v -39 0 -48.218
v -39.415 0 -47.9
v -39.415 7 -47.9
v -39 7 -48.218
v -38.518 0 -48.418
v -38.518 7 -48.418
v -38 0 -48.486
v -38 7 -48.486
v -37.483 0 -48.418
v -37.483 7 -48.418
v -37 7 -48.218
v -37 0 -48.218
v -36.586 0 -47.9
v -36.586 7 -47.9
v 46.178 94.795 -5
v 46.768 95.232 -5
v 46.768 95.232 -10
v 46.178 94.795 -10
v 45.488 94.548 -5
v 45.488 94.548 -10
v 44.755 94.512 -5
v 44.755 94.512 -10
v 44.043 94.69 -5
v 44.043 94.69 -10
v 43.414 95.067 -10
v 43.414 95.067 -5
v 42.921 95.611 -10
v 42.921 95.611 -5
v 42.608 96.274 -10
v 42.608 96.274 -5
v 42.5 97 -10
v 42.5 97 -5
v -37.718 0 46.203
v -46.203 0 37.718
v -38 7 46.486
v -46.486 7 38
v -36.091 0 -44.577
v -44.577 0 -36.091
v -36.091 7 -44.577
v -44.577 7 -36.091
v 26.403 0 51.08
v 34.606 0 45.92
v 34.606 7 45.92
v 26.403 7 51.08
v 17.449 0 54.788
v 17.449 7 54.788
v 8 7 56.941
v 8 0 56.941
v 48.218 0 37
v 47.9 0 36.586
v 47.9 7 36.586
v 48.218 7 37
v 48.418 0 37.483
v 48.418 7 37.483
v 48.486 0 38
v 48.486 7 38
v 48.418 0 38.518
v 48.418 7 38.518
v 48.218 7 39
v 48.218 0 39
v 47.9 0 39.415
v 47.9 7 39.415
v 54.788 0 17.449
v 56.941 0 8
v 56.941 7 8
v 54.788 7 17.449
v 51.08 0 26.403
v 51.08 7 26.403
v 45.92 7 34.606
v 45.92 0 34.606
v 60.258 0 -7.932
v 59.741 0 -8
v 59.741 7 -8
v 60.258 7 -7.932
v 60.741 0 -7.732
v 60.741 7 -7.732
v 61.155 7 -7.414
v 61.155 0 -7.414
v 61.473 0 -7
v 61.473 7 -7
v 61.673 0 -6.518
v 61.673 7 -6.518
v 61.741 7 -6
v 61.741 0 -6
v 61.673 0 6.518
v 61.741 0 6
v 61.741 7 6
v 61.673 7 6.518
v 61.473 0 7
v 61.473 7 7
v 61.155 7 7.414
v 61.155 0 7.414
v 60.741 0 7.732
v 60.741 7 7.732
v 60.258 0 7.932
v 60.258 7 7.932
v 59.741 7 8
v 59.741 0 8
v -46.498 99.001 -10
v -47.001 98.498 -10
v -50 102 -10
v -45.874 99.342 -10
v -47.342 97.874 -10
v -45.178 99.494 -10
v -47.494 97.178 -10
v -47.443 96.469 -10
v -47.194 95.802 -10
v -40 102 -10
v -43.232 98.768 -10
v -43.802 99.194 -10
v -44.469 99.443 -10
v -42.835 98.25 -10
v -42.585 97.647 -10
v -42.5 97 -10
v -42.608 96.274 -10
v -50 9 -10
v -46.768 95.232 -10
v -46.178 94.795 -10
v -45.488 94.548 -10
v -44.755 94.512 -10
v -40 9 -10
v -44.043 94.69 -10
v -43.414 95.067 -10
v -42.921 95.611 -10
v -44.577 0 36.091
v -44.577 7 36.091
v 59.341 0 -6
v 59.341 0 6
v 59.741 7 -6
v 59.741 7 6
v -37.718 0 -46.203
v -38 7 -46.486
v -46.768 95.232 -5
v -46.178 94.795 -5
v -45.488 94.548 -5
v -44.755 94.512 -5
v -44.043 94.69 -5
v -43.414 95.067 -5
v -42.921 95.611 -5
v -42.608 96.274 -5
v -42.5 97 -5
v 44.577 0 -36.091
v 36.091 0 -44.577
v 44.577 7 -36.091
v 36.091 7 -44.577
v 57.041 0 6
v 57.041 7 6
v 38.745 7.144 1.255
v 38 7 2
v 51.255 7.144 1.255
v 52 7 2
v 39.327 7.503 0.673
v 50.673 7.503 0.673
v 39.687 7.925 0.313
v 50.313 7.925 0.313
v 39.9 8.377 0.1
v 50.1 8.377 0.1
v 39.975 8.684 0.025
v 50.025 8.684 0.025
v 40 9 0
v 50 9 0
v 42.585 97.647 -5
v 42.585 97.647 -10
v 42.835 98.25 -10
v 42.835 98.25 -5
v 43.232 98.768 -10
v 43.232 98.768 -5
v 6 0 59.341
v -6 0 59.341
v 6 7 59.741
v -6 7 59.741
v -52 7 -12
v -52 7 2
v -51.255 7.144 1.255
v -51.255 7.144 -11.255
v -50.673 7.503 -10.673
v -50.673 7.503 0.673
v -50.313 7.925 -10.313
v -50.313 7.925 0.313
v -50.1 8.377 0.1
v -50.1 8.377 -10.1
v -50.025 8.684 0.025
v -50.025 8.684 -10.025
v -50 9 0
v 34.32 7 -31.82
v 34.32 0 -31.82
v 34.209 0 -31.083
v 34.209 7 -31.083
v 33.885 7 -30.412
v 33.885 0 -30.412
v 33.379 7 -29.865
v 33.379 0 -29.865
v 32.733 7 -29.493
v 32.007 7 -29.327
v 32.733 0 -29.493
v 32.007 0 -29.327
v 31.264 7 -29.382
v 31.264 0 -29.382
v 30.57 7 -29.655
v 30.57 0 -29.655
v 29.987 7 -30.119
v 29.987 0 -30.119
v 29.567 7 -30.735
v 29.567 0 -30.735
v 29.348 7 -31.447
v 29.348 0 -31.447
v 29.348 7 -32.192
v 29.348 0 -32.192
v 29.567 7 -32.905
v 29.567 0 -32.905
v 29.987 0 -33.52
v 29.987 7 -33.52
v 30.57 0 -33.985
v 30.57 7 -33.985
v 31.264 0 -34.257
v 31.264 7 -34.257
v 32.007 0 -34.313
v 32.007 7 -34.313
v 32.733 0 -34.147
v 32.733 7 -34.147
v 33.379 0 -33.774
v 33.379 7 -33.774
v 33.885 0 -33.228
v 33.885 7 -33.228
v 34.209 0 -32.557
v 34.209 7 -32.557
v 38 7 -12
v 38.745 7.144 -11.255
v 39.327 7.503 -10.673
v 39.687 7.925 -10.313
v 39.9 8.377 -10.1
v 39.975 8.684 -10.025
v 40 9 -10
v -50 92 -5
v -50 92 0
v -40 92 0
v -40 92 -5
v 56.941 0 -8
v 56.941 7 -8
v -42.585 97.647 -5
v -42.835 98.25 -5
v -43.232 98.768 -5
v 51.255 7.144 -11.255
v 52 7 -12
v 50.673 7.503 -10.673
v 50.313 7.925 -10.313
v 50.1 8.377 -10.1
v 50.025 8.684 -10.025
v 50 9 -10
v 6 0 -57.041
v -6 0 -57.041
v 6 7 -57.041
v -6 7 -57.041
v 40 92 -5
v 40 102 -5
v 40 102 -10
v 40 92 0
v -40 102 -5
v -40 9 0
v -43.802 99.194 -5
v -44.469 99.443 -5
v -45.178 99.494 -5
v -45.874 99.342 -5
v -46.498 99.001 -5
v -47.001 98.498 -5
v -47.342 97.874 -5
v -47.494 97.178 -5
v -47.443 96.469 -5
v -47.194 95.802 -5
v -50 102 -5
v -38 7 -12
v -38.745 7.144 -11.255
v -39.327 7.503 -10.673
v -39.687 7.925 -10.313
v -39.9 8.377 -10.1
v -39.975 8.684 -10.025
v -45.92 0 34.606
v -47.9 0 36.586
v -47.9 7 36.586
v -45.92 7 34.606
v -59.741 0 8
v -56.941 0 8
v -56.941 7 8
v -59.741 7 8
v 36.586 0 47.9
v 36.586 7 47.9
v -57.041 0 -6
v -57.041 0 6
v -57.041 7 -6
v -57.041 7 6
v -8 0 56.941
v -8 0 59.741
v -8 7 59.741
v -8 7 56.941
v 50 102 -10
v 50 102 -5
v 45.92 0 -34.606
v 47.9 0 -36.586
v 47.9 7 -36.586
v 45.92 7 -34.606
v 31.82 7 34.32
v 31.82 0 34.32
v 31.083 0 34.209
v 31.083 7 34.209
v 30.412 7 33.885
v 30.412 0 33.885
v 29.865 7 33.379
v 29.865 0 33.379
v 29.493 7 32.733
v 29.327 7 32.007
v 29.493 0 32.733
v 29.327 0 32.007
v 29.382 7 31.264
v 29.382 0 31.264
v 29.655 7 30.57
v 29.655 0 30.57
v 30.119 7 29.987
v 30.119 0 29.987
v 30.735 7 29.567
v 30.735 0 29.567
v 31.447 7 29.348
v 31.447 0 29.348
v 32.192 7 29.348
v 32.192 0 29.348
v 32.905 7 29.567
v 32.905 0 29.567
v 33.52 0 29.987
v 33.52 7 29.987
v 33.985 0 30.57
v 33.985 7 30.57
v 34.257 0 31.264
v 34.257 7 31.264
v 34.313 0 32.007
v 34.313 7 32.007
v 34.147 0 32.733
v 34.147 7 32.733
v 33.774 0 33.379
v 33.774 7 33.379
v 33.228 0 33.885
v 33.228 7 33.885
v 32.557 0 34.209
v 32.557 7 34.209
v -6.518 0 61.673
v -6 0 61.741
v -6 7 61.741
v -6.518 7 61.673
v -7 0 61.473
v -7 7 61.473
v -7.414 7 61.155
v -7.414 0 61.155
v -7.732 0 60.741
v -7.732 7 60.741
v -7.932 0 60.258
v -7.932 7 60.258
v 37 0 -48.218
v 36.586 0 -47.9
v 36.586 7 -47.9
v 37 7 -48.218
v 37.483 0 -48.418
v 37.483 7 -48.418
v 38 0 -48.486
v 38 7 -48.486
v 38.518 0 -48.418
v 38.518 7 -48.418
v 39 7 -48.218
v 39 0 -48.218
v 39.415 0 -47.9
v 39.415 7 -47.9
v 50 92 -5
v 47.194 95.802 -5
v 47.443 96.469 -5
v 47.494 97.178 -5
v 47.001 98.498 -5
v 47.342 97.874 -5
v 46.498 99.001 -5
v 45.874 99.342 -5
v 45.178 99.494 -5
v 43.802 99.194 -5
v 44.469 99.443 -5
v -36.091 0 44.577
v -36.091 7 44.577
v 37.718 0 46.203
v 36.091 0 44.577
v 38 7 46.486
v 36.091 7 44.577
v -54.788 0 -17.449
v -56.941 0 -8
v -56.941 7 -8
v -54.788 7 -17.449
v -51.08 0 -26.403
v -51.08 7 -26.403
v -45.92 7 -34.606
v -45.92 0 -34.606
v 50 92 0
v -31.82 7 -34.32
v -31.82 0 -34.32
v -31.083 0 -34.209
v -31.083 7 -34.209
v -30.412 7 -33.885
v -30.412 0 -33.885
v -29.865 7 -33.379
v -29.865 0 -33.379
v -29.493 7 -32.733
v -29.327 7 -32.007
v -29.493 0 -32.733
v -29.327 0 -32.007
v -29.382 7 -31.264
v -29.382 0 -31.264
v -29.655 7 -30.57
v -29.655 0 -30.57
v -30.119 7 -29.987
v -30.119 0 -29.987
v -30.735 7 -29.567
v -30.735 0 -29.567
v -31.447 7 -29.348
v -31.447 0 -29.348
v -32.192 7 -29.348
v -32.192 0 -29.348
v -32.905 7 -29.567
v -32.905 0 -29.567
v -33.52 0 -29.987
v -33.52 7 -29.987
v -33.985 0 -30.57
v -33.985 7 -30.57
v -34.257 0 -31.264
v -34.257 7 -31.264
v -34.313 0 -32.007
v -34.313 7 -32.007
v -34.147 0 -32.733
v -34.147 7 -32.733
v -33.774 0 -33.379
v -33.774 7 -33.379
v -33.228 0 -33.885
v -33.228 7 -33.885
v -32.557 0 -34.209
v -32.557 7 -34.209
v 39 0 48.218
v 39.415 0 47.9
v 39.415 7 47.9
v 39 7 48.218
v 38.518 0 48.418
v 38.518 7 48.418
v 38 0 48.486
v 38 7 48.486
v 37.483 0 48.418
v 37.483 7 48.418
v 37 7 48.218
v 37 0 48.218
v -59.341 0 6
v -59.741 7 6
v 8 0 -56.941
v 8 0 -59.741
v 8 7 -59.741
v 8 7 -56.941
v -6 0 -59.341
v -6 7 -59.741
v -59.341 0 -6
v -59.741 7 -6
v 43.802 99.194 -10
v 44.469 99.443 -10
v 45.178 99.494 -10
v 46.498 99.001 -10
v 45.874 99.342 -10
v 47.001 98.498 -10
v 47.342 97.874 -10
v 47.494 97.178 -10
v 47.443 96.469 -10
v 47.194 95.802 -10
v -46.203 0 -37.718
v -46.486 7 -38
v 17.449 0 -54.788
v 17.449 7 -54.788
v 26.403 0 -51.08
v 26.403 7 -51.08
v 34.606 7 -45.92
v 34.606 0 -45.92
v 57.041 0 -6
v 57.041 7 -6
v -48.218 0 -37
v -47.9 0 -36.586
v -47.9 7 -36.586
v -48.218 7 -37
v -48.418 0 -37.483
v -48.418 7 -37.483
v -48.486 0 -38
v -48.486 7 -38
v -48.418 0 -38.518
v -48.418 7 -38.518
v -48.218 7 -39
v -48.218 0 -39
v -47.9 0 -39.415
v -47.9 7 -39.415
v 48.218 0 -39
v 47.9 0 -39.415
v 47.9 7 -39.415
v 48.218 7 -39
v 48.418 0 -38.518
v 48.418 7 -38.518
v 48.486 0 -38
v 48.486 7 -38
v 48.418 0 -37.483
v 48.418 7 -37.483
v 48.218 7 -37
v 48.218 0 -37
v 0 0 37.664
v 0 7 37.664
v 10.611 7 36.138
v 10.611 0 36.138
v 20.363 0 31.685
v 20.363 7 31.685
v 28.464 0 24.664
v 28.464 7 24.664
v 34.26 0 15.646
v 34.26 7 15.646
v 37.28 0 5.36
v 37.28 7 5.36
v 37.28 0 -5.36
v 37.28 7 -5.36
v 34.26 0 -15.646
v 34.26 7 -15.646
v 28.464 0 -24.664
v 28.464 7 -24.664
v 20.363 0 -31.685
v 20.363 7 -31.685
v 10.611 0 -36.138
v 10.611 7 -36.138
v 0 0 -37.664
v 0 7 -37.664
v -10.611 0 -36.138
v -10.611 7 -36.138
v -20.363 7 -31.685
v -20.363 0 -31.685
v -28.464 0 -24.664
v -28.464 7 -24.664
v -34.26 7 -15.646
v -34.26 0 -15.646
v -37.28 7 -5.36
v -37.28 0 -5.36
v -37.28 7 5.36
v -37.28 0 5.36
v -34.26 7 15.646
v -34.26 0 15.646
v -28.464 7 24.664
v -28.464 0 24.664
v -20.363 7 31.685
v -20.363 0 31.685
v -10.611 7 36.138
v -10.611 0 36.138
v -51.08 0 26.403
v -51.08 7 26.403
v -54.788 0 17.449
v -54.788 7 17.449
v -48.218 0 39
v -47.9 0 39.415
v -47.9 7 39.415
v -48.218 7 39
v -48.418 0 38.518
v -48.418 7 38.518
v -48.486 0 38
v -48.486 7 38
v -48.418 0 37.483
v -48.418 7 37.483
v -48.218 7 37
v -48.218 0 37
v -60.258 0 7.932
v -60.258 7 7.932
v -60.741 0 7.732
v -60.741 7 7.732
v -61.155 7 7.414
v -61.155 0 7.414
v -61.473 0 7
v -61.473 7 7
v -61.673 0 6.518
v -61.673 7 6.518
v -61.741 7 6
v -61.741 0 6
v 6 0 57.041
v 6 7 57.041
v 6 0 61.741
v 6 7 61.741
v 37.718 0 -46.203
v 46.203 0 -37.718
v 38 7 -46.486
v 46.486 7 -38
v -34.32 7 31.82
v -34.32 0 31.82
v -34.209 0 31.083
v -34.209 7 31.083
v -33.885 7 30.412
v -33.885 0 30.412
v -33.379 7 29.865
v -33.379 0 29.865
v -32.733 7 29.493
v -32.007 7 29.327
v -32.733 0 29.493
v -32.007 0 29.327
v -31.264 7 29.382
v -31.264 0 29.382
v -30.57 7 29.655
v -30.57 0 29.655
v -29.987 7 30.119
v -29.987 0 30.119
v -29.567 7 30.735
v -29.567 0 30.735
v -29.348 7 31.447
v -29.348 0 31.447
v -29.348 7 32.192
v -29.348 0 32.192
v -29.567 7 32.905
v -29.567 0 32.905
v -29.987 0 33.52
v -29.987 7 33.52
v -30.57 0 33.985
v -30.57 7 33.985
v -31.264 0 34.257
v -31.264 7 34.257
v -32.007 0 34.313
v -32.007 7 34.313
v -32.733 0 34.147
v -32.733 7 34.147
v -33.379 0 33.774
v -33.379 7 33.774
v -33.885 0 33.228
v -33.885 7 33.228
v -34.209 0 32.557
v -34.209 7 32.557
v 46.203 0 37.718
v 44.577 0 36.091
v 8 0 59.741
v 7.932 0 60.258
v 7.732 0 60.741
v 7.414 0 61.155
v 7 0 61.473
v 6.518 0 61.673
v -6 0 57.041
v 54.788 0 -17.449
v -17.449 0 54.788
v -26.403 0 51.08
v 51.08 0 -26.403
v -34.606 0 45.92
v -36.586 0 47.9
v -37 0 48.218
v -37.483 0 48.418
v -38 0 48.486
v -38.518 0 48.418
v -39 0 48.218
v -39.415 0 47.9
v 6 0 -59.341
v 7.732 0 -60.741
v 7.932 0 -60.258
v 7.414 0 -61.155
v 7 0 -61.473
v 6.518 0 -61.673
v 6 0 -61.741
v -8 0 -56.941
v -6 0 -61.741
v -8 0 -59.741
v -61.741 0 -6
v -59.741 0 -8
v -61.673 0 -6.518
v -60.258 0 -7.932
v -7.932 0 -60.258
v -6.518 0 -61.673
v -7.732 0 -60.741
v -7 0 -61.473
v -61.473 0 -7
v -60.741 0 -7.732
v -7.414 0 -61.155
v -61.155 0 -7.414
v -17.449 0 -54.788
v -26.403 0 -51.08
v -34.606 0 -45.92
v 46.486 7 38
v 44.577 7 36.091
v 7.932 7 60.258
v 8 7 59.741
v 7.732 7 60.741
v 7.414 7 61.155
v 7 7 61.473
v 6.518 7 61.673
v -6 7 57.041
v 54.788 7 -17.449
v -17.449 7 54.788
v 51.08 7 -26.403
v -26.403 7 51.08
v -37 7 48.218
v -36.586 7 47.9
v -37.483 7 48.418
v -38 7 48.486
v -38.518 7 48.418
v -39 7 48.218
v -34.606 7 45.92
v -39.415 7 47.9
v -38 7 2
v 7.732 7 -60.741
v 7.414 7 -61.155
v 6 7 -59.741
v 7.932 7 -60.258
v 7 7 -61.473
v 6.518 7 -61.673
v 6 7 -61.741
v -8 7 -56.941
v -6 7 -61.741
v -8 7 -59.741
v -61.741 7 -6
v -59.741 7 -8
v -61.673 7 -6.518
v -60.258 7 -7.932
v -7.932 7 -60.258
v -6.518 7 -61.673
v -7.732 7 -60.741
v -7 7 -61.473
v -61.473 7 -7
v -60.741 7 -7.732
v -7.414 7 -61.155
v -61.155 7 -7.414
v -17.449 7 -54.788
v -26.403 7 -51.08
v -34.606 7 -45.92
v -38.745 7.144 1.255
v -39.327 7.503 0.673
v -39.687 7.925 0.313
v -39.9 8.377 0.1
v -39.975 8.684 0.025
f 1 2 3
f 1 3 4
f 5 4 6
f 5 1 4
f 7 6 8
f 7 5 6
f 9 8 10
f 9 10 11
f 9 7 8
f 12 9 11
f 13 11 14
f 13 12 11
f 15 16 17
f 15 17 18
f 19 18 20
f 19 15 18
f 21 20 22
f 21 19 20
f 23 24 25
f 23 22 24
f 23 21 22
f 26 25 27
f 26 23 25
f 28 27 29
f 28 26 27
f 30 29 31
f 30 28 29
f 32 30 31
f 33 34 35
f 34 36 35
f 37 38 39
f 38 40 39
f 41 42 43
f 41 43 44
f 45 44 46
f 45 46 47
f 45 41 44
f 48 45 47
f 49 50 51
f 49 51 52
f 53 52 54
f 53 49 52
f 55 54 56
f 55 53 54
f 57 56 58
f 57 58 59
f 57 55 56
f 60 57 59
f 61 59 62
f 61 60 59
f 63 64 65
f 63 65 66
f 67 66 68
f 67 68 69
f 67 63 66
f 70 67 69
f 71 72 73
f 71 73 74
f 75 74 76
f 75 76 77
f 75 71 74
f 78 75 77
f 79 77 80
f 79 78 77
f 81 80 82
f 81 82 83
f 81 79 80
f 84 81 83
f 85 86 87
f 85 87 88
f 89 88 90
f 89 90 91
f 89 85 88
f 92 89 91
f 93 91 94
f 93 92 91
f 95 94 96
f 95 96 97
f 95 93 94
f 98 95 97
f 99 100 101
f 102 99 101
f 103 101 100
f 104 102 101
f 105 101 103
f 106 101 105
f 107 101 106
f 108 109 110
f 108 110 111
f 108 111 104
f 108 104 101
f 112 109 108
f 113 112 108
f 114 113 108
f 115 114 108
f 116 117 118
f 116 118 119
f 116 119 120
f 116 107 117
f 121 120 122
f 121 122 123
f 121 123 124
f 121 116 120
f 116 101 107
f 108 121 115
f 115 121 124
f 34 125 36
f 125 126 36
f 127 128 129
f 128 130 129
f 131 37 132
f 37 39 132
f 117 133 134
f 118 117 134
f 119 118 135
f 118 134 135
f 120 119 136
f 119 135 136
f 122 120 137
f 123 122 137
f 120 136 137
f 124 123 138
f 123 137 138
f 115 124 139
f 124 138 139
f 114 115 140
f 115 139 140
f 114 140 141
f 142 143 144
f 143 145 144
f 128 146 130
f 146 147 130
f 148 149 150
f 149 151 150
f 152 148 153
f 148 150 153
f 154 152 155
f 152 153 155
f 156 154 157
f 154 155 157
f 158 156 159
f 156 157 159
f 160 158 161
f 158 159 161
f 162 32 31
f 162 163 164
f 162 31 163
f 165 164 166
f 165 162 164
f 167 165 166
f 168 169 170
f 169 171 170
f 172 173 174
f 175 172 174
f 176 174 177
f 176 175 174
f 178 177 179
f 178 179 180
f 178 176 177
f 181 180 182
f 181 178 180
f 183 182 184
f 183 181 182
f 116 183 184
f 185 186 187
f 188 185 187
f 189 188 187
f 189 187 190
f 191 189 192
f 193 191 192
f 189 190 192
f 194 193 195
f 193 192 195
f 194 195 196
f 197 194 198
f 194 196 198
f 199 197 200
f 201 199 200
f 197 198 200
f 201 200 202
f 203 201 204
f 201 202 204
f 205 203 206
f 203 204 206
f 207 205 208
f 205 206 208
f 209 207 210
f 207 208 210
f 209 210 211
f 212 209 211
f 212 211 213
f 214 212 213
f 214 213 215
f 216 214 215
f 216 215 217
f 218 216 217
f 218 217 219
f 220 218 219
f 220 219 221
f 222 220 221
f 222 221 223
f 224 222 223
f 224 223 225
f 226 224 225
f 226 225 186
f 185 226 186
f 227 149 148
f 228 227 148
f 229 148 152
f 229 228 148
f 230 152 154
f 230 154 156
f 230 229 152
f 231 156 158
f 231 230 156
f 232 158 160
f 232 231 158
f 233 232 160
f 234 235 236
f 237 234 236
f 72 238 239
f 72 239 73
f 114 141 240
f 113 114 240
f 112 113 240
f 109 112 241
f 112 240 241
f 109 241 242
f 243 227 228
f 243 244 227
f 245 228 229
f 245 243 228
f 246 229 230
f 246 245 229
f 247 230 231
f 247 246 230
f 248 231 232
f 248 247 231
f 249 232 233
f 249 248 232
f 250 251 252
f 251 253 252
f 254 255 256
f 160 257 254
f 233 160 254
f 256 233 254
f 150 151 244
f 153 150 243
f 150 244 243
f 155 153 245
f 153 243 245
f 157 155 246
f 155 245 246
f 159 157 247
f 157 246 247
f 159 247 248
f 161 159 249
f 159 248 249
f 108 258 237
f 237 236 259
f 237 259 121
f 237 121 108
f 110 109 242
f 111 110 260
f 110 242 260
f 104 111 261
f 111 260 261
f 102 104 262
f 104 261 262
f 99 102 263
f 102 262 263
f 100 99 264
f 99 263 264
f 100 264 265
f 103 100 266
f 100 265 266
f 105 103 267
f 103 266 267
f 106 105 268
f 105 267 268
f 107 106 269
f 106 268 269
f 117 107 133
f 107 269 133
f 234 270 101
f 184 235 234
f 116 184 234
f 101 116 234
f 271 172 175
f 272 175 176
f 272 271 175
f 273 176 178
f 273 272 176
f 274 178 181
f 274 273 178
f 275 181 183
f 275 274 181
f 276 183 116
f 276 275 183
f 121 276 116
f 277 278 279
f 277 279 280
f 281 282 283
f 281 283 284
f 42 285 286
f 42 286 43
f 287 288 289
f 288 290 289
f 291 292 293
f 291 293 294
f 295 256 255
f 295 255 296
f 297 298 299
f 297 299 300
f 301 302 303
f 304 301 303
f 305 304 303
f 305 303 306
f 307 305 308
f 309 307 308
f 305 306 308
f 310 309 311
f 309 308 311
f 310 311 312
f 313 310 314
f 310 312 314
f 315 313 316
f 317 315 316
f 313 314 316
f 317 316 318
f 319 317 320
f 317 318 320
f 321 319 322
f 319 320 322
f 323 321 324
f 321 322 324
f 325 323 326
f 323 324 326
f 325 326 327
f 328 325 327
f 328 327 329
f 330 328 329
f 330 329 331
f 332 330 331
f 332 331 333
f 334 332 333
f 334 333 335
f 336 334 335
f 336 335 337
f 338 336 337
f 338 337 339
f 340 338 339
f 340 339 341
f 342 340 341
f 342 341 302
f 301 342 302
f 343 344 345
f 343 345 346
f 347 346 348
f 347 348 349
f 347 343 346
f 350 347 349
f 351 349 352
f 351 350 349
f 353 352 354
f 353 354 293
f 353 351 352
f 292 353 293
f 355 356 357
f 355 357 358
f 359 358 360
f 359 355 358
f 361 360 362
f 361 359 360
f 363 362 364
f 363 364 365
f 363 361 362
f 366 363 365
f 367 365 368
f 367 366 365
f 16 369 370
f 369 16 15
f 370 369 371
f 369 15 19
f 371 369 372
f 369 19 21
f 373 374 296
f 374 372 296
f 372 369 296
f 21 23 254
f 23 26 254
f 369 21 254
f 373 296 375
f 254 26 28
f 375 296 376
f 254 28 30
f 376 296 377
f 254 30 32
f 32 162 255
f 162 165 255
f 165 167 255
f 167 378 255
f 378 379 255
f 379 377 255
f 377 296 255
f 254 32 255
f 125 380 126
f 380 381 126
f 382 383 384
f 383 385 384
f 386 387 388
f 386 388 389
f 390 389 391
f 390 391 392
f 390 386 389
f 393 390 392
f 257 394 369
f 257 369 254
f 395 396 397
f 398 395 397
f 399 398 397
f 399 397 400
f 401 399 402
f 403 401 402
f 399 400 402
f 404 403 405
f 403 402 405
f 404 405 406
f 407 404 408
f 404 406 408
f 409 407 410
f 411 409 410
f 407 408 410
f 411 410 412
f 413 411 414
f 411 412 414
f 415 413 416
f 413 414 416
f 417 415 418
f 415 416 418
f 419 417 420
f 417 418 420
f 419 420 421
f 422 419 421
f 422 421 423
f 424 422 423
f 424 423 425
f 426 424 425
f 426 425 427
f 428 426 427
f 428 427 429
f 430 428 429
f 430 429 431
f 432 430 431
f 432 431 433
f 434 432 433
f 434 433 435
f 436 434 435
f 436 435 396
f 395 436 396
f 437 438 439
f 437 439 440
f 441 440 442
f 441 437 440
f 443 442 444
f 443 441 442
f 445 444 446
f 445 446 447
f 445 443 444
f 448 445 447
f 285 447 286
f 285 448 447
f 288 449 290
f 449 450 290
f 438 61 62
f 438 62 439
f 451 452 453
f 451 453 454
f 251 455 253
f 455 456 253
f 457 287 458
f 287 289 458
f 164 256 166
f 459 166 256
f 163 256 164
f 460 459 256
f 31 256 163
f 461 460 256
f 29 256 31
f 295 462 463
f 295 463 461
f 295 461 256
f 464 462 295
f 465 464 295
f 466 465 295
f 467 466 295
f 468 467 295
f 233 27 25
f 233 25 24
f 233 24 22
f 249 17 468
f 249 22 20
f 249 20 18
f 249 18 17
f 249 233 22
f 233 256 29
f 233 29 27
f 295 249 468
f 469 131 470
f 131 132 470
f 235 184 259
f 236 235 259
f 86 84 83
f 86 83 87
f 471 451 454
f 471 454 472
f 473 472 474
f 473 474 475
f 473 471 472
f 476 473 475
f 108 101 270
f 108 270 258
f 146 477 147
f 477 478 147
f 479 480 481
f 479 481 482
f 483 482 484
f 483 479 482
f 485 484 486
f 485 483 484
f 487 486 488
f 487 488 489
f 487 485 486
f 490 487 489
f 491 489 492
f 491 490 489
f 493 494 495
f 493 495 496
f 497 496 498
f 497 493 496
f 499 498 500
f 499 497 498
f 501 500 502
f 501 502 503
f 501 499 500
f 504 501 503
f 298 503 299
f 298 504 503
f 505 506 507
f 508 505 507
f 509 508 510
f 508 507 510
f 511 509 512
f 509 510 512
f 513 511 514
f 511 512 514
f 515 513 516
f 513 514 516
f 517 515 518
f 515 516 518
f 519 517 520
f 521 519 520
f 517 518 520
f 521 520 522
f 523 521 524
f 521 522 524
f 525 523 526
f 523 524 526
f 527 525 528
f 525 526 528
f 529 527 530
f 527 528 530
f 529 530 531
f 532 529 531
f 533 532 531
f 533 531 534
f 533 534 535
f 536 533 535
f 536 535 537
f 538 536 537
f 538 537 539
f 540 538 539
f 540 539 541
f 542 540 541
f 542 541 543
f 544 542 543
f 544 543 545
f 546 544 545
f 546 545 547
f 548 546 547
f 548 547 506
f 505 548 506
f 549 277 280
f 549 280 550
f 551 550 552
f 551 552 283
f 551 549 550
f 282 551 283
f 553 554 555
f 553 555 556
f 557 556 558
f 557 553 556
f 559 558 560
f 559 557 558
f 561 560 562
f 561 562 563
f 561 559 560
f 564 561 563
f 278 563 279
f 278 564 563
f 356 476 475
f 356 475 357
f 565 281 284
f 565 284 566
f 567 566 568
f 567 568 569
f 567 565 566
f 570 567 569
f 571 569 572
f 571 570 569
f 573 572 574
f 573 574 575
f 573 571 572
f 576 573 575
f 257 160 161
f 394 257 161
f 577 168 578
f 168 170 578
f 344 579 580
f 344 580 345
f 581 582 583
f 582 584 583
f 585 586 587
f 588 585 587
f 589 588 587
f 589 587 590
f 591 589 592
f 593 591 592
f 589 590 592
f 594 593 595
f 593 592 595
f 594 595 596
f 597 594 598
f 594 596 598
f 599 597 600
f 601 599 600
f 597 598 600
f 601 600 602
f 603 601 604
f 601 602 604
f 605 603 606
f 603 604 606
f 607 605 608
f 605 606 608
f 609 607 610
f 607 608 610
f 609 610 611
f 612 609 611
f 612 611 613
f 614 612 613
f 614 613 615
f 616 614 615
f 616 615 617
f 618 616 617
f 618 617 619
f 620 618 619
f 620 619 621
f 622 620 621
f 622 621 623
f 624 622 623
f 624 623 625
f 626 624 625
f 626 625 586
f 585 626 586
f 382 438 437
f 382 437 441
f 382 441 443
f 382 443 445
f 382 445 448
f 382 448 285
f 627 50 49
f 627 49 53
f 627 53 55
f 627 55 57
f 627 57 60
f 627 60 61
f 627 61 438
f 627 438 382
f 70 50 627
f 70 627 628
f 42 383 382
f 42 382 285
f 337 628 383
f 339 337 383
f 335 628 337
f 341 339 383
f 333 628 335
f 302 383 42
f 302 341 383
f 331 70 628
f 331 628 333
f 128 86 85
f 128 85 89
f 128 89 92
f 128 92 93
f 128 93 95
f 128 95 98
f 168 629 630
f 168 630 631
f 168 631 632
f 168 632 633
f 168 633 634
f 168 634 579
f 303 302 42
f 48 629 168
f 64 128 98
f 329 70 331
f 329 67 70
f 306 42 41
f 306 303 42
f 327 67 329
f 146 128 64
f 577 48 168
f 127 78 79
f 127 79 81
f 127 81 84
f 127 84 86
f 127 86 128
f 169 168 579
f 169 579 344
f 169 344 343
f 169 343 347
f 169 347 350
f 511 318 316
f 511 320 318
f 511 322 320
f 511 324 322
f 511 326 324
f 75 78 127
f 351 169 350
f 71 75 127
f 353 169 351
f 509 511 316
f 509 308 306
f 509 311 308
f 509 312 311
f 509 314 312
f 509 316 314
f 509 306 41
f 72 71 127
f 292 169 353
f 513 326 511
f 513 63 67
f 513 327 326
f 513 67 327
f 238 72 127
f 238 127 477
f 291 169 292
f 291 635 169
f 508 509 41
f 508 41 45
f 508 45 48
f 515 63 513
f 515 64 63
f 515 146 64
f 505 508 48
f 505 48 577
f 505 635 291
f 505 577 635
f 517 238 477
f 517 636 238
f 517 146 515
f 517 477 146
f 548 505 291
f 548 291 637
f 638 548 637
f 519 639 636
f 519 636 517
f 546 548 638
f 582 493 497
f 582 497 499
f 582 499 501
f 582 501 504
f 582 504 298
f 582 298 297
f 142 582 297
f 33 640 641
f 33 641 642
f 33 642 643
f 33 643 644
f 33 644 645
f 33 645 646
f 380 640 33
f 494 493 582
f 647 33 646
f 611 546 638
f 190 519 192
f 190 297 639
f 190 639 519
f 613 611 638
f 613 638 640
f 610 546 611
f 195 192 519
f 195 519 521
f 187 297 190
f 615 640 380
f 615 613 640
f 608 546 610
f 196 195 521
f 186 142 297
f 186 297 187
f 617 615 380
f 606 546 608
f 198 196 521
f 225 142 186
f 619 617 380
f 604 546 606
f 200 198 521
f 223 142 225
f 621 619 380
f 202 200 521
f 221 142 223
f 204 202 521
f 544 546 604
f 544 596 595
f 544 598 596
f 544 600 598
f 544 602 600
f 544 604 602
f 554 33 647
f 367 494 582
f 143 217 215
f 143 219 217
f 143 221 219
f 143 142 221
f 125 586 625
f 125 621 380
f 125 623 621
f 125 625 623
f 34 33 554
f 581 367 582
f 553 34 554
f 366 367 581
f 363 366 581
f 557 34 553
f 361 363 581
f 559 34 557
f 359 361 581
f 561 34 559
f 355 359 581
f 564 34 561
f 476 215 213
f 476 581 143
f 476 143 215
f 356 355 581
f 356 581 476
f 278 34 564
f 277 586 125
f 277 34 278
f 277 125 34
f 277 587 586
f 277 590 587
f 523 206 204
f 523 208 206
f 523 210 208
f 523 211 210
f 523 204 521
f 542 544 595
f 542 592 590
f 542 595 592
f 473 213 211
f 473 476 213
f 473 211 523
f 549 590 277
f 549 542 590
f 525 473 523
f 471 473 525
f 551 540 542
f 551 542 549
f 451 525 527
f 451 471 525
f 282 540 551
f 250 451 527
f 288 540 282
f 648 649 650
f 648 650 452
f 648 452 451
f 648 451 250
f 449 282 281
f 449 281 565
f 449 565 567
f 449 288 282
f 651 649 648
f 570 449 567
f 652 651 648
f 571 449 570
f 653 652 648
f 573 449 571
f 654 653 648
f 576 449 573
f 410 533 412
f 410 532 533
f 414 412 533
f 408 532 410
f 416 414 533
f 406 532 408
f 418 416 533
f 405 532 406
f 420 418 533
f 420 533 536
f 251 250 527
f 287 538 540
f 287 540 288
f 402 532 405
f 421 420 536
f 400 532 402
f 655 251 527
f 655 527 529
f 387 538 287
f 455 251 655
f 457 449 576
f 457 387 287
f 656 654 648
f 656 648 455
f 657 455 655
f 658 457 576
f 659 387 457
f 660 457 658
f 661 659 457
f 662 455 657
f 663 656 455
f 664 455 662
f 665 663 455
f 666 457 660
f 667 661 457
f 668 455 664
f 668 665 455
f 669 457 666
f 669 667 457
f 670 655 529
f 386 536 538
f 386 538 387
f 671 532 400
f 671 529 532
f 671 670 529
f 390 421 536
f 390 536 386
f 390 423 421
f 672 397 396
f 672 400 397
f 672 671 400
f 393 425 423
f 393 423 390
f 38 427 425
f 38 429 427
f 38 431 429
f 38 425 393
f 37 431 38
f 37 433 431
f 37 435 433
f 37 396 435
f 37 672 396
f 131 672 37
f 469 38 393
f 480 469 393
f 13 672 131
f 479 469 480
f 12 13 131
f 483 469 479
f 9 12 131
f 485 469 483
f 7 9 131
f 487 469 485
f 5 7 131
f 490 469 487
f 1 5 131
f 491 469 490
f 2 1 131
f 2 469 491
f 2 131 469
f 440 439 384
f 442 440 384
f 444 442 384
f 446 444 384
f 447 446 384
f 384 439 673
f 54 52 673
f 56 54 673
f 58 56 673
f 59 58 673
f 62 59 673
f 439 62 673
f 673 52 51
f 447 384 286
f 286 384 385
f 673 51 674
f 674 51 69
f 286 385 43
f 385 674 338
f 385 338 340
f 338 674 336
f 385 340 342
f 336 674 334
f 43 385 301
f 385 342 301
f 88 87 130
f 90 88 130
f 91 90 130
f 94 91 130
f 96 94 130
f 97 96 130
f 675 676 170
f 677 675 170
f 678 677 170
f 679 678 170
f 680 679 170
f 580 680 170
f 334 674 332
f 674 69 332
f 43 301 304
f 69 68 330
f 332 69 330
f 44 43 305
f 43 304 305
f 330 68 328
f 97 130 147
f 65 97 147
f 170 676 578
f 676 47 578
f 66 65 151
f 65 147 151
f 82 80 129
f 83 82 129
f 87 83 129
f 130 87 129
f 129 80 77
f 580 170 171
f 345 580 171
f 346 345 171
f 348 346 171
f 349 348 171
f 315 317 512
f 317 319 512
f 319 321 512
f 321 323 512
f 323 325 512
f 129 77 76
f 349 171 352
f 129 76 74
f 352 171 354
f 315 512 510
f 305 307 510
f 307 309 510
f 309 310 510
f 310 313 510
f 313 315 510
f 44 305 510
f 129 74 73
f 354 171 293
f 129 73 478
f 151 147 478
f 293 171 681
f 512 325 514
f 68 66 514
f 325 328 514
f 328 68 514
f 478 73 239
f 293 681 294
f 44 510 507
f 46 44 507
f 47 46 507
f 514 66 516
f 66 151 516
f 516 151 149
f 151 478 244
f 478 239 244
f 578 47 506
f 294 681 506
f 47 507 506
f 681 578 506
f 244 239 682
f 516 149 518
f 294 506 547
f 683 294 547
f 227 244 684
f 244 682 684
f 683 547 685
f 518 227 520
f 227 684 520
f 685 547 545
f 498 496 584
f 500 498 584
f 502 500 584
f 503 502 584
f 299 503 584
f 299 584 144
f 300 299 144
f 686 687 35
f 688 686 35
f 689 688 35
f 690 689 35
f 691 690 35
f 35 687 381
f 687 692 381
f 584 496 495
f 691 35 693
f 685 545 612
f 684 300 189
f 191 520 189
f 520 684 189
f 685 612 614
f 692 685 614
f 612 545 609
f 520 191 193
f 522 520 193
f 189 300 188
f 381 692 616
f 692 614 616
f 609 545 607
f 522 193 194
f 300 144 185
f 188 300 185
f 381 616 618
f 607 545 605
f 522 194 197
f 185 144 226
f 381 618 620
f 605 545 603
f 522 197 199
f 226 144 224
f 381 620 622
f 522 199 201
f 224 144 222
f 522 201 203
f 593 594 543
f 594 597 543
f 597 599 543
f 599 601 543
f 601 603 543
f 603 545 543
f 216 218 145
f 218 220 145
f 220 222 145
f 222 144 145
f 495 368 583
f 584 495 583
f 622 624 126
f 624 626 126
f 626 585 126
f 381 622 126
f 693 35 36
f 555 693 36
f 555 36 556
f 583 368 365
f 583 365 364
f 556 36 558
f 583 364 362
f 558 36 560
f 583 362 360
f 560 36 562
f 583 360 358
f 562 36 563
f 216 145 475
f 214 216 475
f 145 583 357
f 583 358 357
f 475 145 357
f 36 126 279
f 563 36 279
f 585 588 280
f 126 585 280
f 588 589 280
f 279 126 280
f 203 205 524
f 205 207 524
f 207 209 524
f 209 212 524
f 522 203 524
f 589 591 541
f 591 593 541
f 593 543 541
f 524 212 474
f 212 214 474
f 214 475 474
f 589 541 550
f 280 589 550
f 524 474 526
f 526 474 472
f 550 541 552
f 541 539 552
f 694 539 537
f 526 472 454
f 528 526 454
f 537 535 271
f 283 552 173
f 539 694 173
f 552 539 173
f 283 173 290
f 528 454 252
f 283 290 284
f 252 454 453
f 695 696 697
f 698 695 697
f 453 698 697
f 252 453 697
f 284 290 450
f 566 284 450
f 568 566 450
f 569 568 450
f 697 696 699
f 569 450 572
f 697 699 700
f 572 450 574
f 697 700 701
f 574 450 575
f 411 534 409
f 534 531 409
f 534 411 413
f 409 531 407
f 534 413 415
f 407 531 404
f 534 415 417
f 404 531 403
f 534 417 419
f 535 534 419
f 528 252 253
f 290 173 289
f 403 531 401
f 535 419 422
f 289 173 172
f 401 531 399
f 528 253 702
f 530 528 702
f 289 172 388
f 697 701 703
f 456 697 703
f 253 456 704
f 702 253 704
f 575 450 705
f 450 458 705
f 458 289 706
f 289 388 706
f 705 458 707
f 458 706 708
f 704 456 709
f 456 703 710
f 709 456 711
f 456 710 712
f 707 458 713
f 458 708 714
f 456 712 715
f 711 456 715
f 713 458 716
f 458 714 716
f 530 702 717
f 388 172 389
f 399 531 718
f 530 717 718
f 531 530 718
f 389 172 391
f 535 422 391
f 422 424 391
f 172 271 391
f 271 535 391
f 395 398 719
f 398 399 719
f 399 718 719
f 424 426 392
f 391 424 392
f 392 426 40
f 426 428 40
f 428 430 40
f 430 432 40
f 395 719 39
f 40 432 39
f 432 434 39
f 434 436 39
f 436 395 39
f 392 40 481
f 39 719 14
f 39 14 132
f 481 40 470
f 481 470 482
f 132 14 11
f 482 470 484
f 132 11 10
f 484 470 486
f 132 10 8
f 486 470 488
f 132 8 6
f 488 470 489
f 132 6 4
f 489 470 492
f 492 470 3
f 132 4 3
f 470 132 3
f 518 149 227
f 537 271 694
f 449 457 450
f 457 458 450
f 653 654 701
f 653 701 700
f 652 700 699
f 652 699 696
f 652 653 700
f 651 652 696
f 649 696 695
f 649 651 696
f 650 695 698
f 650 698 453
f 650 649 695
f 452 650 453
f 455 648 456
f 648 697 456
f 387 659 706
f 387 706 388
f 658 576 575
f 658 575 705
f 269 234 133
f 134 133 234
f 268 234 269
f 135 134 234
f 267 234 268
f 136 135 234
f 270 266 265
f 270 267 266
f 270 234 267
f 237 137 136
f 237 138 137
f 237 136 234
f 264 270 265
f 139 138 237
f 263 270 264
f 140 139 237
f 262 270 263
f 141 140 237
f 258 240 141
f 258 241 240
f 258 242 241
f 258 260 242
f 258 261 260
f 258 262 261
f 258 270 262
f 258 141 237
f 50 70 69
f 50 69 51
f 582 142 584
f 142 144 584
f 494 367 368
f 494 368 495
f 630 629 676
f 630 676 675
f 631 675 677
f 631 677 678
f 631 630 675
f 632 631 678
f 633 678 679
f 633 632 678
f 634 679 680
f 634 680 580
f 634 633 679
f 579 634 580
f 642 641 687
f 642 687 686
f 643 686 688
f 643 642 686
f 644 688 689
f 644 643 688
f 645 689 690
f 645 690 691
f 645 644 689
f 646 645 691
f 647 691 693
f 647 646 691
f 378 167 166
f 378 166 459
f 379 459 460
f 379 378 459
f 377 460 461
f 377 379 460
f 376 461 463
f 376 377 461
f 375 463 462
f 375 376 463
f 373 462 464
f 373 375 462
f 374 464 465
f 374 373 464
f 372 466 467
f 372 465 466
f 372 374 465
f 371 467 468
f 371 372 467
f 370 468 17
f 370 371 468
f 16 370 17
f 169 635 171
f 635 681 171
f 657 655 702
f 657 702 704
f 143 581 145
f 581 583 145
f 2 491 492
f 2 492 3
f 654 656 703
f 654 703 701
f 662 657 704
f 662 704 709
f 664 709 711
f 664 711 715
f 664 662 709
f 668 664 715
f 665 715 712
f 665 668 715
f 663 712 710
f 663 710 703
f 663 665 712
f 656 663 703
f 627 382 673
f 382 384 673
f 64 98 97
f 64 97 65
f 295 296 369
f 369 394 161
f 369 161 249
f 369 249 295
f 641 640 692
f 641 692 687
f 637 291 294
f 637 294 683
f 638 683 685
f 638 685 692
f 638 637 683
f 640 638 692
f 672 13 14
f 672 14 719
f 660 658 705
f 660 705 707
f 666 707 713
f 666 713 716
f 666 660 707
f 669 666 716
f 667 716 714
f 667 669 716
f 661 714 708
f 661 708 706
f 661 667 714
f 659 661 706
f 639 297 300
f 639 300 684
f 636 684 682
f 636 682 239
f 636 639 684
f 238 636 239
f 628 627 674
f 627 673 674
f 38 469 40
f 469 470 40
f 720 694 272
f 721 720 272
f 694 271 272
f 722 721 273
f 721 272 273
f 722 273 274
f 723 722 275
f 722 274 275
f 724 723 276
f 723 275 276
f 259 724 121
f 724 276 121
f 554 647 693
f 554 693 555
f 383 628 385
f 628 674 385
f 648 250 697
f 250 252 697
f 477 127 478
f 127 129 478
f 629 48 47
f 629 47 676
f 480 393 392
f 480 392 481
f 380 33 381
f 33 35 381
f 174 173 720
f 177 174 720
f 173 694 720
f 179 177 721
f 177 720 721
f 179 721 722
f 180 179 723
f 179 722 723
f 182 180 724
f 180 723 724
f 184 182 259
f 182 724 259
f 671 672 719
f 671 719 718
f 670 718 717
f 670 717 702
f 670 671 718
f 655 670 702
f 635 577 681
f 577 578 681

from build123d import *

# Parameters (mm, degrees)
BOSS_EXTRUDE1_DEPTH = 7
SKETCH3_R           = 37.663730654
CUT_EXTRUDE1_DEPTH  = 88.594763353
CIRPATTERN1_COUNT   = 8
SKETCH8_W           = 10
SKETCH8_H           = 10
BOSS_EXTRUDE2_DEPTH = 95
SKETCH9_W           = 10
SKETCH9_H           = 10
SKETCH9_R           = 2.5
CUT_EXTRUDE2_DEPTH  = 5
CUT_EXTRUDE3_DEPTH  = 135.267801676
SKETCH11_R          = 2.5
CUT_EXTRUDE4_DEPTH  = 135.267801676
CIRPATTERN2_COUNT   = 4
FILLET1_R           = 2


with BuildPart() as part:
    # Sketch1 → Boss-Extrude1 (new body)
    with BuildSketch(Plane(origin=(0, 0, 0), x_dir=(1, 0, 0), z_dir=(0, 1, 0))):
        with BuildLine():
            Line((-8, 56.940758688), (-8, 59.740758688))
            ThreePointArc((-8, 59.740758688), (-7.414213562, 61.154972251), (-6, 61.740758688))
            Line((-6, 61.740758688), (6, 61.740758688))
            ThreePointArc((6, 61.740758688), (7.414213562, 61.154972251), (8, 59.740758688))
            Line((8, 59.740758688), (8, 56.940758688))
            ThreePointArc((8, 56.940758688), (22.004297361, 53.123073119), (34.606342345, 45.920050844))
            Line((34.606342345, 45.920050844), (36.586241332, 47.899949831))
            ThreePointArc((36.586241332, 47.899949831), (38.000454895, 48.485736269), (39.414668457, 47.899949831))
            Line((39.414668457, 47.899949831), (47.899949831, 39.414668457))
            ThreePointArc((47.899949831, 39.414668457), (48.485736269, 38.000454895), (47.899949831, 36.586241332))
            Line((47.899949831, 36.586241332), (45.920050844, 34.606342345))
            ThreePointArc((45.920050844, 34.606342345), (53.123073119, 22.004297361), (56.940758688, 8))
            Line((56.940758688, 8), (59.740758688, 8))
            ThreePointArc((59.740758688, 8), (61.154972251, 7.414213562), (61.740758688, 6))
            Line((61.740758688, 6), (61.740758688, -6))
            ThreePointArc((61.740758688, -6), (61.154972251, -7.414213562), (59.740758688, -8))
            Line((59.740758688, -8), (56.940758688, -8))
            ThreePointArc((56.940758688, -8), (53.123073119, -22.004297361), (45.920050844, -34.606342345))
            Line((45.920050844, -34.606342345), (47.899949831, -36.586241332))
            ThreePointArc((47.899949831, -36.586241332), (48.485736269, -38.000454895), (47.899949831, -39.414668457))
            Line((47.899949831, -39.414668457), (39.414668457, -47.899949831))
            ThreePointArc((39.414668457, -47.899949831), (38.000454895, -48.485736269), (36.586241332, -47.899949831))
            Line((36.586241332, -47.899949831), (34.606342345, -45.920050844))
            ThreePointArc((34.606342345, -45.920050844), (22.004297361, -53.123073119), (8, -56.940758688))
            Line((8, -56.940758688), (8, -59.740758688))
            ThreePointArc((8, -59.740758688), (7.414213562, -61.154972251), (6, -61.740758688))
            Line((6, -61.740758688), (-6, -61.740758688))
            ThreePointArc((-6, -61.740758688), (-7.414213562, -61.154972251), (-8, -59.740758688))
            Line((-8, -59.740758688), (-8, -56.940758688))
            ThreePointArc((-8, -56.940758688), (-22.004297361, -53.123073119), (-34.606342345, -45.920050844))
            Line((-34.606342345, -45.920050844), (-36.586241332, -47.899949831))
            ThreePointArc((-36.586241332, -47.899949831), (-38.000454895, -48.485736269), (-39.414668457, -47.899949831))
            Line((-39.414668457, -47.899949831), (-47.899949831, -39.414668457))
            ThreePointArc((-47.899949831, -39.414668457), (-48.485736269, -38.000454895), (-47.899949831, -36.586241332))
            Line((-47.899949831, -36.586241332), (-45.920050844, -34.606342345))
            ThreePointArc((-45.920050844, -34.606342345), (-53.123073119, -22.004297361), (-56.940758688, -8))
            Line((-56.940758688, -8), (-59.740758688, -8))
            ThreePointArc((-59.740758688, -8), (-61.154972251, -7.414213562), (-61.740758688, -6))
            Line((-61.740758688, -6), (-61.740758688, 6))
            ThreePointArc((-61.740758688, 6), (-61.154972251, 7.414213562), (-59.740758688, 8))
            Line((-59.740758688, 8), (-56.940758688, 8))
            ThreePointArc((-56.940758688, 8), (-53.123073119, 22.004297361), (-45.920050844, 34.606342345))
            Line((-45.920050844, 34.606342345), (-47.899949831, 36.586241332))
            ThreePointArc((-47.899949831, 36.586241332), (-48.485736269, 38.000454895), (-47.899949831, 39.414668457))
            Line((-47.899949831, 39.414668457), (-39.414668457, 47.899949831))
            ThreePointArc((-39.414668457, 47.899949831), (-38.000454895, 48.485736269), (-36.586241332, 47.899949831))
            Line((-36.586241332, 47.899949831), (-34.606342345, 45.920050844))
            ThreePointArc((-34.606342345, 45.920050844), (-22.004297361, 53.123073119), (-8, 56.940758688))
        make_face()
    extrude(amount=BOSS_EXTRUDE1_DEPTH)

    # Sketch3 → Cut-Extrude1 (cut, through all)
    with BuildSketch(Plane(origin=(0, 7, 0), x_dir=(1, 0, 0), z_dir=(0, 1, 0))):
        with Locations(Location((0, 0, 0), (0, 0, 270))):
            Circle(SKETCH3_R)
    extrude(amount=-CUT_EXTRUDE1_DEPTH, mode=Mode.SUBTRACT)

    # Sketch7 → Cut-Loft1 section 0
    with BuildSketch(Plane.XZ):
        with BuildLine():
            Line((-6, -57.040758688), (6, -57.040758688))
            Line((6, -57.040758688), (6, -59.340758688))
            Line((6, -59.340758688), (-6, -59.340758688))
            Line((-6, -59.340758688), (-6, -57.040758688))
        make_face()
    # Sketch5 → Cut-Loft1 section 1
    with BuildSketch(Plane(origin=(0, 7, 0), x_dir=(1, 0, 0), z_dir=(0, 1, 0))):
        with BuildLine():
            Line((-6, 59.740758688), (6, 59.740758688))
            Line((6, 59.740758688), (6, 57.040758688))
            Line((6, 57.040758688), (-6, 57.040758688))
            Line((-6, 57.040758688), (-6, 59.740758688))
        make_face()
    cut_loft1 = loft(mode=Mode.SUBTRACT)

    # CirPattern1: Cut-Loft1 ×8 about axis
    cirpattern1_axis = Axis((0, 0, 0), (0, 1, 0))
    for i in range(1, CIRPATTERN1_COUNT):
        add(cut_loft1.rotate(cirpattern1_axis, i * 360 / CIRPATTERN1_COUNT), mode=Mode.SUBTRACT)

    # Sketch8 → Boss-Extrude2 (add)
    with BuildSketch(Plane(origin=(0, 7, 0), x_dir=(1, 0, 0), z_dir=(0, 1, 0))):
        with Locations((45, 5)):
            Rectangle(SKETCH8_W, SKETCH8_H)
        with Locations((-45, 5)):
            Rectangle(SKETCH8_W, SKETCH8_H)
    extrude(amount=BOSS_EXTRUDE2_DEPTH)

    # Sketch9 → Cut-Extrude2 (cut)
    with BuildSketch(Plane.XY):
        with Locations((-45, 97)):
            Rectangle(SKETCH9_W, SKETCH9_H)
        with Locations((-45, 97)):
            Circle(SKETCH9_R, mode=Mode.SUBTRACT)
    cut_extrude2 = extrude(amount=-CUT_EXTRUDE2_DEPTH, mode=Mode.SUBTRACT)

    # Sketch9<2> → Cut-Extrude3 (cut, through all)
    with BuildSketch(Plane.XY):
        with BuildLine():
            ThreePointArc((-42.5, 97), (-42.690301169, 97.956708581), (-43.232233047, 98.767766953))
            Line((-43.232233047, 98.767766953), (-46.767766953, 95.232233047))
            ThreePointArc((-46.767766953, 95.232233047), (-44.043291419, 94.690301169), (-42.5, 97))
        make_face()
        with BuildLine():
            Line((-46.767766953, 95.232233047), (-43.232233047, 98.767766953))
            ThreePointArc((-43.232233047, 98.767766953), (-46.767766953, 98.767766953), (-46.767766953, 95.232233047))
        make_face()
    cut_extrude3 = extrude(amount=-CUT_EXTRUDE3_DEPTH, mode=Mode.SUBTRACT)

    # Mirror1: Cut-Extrude2, Cut-Extrude3 across plane
    add(cut_extrude2.mirror(Plane(origin=(0, 0, 0), x_dir=(0, 0, 1), z_dir=(1, 0, 0))), mode=Mode.SUBTRACT)
    add(cut_extrude3.mirror(Plane(origin=(0, 0, 0), x_dir=(0, 0, 1), z_dir=(1, 0, 0))), mode=Mode.SUBTRACT)

    # Sketch11 → Cut-Extrude4 (cut, through all)
    with BuildSketch(Plane.XZ):
        with Locations(Location((-31.819805153, -31.819805153, 0), (0, 0, 270))):
            Circle(SKETCH11_R)
    cut_extrude4 = extrude(amount=-CUT_EXTRUDE4_DEPTH, mode=Mode.SUBTRACT)

    # CirPattern2: Cut-Extrude4 ×4 about axis
    cirpattern2_axis = Axis((0, 0, 0), (0, 1, 0))
    for i in range(1, CIRPATTERN2_COUNT):
        add(cut_extrude4.rotate(cirpattern2_axis, i * 360 / CIRPATTERN2_COUNT), mode=Mode.SUBTRACT)

    # Fillet1
    fillet1_edges = [part.edges().sort_by_distance(p)[0] for p in [
        (50, 7, -5),
        (45, 7, -10),
        (40, 7, -5),
        (45, 7, 0),
        (-45, 7, -10),
        (-50, 7, -5),
        (-45, 7, 0),
        (-40, 7, -5),
    ]]
    fillet(fillet1_edges, radius=FILLET1_R)


solid = part.part
